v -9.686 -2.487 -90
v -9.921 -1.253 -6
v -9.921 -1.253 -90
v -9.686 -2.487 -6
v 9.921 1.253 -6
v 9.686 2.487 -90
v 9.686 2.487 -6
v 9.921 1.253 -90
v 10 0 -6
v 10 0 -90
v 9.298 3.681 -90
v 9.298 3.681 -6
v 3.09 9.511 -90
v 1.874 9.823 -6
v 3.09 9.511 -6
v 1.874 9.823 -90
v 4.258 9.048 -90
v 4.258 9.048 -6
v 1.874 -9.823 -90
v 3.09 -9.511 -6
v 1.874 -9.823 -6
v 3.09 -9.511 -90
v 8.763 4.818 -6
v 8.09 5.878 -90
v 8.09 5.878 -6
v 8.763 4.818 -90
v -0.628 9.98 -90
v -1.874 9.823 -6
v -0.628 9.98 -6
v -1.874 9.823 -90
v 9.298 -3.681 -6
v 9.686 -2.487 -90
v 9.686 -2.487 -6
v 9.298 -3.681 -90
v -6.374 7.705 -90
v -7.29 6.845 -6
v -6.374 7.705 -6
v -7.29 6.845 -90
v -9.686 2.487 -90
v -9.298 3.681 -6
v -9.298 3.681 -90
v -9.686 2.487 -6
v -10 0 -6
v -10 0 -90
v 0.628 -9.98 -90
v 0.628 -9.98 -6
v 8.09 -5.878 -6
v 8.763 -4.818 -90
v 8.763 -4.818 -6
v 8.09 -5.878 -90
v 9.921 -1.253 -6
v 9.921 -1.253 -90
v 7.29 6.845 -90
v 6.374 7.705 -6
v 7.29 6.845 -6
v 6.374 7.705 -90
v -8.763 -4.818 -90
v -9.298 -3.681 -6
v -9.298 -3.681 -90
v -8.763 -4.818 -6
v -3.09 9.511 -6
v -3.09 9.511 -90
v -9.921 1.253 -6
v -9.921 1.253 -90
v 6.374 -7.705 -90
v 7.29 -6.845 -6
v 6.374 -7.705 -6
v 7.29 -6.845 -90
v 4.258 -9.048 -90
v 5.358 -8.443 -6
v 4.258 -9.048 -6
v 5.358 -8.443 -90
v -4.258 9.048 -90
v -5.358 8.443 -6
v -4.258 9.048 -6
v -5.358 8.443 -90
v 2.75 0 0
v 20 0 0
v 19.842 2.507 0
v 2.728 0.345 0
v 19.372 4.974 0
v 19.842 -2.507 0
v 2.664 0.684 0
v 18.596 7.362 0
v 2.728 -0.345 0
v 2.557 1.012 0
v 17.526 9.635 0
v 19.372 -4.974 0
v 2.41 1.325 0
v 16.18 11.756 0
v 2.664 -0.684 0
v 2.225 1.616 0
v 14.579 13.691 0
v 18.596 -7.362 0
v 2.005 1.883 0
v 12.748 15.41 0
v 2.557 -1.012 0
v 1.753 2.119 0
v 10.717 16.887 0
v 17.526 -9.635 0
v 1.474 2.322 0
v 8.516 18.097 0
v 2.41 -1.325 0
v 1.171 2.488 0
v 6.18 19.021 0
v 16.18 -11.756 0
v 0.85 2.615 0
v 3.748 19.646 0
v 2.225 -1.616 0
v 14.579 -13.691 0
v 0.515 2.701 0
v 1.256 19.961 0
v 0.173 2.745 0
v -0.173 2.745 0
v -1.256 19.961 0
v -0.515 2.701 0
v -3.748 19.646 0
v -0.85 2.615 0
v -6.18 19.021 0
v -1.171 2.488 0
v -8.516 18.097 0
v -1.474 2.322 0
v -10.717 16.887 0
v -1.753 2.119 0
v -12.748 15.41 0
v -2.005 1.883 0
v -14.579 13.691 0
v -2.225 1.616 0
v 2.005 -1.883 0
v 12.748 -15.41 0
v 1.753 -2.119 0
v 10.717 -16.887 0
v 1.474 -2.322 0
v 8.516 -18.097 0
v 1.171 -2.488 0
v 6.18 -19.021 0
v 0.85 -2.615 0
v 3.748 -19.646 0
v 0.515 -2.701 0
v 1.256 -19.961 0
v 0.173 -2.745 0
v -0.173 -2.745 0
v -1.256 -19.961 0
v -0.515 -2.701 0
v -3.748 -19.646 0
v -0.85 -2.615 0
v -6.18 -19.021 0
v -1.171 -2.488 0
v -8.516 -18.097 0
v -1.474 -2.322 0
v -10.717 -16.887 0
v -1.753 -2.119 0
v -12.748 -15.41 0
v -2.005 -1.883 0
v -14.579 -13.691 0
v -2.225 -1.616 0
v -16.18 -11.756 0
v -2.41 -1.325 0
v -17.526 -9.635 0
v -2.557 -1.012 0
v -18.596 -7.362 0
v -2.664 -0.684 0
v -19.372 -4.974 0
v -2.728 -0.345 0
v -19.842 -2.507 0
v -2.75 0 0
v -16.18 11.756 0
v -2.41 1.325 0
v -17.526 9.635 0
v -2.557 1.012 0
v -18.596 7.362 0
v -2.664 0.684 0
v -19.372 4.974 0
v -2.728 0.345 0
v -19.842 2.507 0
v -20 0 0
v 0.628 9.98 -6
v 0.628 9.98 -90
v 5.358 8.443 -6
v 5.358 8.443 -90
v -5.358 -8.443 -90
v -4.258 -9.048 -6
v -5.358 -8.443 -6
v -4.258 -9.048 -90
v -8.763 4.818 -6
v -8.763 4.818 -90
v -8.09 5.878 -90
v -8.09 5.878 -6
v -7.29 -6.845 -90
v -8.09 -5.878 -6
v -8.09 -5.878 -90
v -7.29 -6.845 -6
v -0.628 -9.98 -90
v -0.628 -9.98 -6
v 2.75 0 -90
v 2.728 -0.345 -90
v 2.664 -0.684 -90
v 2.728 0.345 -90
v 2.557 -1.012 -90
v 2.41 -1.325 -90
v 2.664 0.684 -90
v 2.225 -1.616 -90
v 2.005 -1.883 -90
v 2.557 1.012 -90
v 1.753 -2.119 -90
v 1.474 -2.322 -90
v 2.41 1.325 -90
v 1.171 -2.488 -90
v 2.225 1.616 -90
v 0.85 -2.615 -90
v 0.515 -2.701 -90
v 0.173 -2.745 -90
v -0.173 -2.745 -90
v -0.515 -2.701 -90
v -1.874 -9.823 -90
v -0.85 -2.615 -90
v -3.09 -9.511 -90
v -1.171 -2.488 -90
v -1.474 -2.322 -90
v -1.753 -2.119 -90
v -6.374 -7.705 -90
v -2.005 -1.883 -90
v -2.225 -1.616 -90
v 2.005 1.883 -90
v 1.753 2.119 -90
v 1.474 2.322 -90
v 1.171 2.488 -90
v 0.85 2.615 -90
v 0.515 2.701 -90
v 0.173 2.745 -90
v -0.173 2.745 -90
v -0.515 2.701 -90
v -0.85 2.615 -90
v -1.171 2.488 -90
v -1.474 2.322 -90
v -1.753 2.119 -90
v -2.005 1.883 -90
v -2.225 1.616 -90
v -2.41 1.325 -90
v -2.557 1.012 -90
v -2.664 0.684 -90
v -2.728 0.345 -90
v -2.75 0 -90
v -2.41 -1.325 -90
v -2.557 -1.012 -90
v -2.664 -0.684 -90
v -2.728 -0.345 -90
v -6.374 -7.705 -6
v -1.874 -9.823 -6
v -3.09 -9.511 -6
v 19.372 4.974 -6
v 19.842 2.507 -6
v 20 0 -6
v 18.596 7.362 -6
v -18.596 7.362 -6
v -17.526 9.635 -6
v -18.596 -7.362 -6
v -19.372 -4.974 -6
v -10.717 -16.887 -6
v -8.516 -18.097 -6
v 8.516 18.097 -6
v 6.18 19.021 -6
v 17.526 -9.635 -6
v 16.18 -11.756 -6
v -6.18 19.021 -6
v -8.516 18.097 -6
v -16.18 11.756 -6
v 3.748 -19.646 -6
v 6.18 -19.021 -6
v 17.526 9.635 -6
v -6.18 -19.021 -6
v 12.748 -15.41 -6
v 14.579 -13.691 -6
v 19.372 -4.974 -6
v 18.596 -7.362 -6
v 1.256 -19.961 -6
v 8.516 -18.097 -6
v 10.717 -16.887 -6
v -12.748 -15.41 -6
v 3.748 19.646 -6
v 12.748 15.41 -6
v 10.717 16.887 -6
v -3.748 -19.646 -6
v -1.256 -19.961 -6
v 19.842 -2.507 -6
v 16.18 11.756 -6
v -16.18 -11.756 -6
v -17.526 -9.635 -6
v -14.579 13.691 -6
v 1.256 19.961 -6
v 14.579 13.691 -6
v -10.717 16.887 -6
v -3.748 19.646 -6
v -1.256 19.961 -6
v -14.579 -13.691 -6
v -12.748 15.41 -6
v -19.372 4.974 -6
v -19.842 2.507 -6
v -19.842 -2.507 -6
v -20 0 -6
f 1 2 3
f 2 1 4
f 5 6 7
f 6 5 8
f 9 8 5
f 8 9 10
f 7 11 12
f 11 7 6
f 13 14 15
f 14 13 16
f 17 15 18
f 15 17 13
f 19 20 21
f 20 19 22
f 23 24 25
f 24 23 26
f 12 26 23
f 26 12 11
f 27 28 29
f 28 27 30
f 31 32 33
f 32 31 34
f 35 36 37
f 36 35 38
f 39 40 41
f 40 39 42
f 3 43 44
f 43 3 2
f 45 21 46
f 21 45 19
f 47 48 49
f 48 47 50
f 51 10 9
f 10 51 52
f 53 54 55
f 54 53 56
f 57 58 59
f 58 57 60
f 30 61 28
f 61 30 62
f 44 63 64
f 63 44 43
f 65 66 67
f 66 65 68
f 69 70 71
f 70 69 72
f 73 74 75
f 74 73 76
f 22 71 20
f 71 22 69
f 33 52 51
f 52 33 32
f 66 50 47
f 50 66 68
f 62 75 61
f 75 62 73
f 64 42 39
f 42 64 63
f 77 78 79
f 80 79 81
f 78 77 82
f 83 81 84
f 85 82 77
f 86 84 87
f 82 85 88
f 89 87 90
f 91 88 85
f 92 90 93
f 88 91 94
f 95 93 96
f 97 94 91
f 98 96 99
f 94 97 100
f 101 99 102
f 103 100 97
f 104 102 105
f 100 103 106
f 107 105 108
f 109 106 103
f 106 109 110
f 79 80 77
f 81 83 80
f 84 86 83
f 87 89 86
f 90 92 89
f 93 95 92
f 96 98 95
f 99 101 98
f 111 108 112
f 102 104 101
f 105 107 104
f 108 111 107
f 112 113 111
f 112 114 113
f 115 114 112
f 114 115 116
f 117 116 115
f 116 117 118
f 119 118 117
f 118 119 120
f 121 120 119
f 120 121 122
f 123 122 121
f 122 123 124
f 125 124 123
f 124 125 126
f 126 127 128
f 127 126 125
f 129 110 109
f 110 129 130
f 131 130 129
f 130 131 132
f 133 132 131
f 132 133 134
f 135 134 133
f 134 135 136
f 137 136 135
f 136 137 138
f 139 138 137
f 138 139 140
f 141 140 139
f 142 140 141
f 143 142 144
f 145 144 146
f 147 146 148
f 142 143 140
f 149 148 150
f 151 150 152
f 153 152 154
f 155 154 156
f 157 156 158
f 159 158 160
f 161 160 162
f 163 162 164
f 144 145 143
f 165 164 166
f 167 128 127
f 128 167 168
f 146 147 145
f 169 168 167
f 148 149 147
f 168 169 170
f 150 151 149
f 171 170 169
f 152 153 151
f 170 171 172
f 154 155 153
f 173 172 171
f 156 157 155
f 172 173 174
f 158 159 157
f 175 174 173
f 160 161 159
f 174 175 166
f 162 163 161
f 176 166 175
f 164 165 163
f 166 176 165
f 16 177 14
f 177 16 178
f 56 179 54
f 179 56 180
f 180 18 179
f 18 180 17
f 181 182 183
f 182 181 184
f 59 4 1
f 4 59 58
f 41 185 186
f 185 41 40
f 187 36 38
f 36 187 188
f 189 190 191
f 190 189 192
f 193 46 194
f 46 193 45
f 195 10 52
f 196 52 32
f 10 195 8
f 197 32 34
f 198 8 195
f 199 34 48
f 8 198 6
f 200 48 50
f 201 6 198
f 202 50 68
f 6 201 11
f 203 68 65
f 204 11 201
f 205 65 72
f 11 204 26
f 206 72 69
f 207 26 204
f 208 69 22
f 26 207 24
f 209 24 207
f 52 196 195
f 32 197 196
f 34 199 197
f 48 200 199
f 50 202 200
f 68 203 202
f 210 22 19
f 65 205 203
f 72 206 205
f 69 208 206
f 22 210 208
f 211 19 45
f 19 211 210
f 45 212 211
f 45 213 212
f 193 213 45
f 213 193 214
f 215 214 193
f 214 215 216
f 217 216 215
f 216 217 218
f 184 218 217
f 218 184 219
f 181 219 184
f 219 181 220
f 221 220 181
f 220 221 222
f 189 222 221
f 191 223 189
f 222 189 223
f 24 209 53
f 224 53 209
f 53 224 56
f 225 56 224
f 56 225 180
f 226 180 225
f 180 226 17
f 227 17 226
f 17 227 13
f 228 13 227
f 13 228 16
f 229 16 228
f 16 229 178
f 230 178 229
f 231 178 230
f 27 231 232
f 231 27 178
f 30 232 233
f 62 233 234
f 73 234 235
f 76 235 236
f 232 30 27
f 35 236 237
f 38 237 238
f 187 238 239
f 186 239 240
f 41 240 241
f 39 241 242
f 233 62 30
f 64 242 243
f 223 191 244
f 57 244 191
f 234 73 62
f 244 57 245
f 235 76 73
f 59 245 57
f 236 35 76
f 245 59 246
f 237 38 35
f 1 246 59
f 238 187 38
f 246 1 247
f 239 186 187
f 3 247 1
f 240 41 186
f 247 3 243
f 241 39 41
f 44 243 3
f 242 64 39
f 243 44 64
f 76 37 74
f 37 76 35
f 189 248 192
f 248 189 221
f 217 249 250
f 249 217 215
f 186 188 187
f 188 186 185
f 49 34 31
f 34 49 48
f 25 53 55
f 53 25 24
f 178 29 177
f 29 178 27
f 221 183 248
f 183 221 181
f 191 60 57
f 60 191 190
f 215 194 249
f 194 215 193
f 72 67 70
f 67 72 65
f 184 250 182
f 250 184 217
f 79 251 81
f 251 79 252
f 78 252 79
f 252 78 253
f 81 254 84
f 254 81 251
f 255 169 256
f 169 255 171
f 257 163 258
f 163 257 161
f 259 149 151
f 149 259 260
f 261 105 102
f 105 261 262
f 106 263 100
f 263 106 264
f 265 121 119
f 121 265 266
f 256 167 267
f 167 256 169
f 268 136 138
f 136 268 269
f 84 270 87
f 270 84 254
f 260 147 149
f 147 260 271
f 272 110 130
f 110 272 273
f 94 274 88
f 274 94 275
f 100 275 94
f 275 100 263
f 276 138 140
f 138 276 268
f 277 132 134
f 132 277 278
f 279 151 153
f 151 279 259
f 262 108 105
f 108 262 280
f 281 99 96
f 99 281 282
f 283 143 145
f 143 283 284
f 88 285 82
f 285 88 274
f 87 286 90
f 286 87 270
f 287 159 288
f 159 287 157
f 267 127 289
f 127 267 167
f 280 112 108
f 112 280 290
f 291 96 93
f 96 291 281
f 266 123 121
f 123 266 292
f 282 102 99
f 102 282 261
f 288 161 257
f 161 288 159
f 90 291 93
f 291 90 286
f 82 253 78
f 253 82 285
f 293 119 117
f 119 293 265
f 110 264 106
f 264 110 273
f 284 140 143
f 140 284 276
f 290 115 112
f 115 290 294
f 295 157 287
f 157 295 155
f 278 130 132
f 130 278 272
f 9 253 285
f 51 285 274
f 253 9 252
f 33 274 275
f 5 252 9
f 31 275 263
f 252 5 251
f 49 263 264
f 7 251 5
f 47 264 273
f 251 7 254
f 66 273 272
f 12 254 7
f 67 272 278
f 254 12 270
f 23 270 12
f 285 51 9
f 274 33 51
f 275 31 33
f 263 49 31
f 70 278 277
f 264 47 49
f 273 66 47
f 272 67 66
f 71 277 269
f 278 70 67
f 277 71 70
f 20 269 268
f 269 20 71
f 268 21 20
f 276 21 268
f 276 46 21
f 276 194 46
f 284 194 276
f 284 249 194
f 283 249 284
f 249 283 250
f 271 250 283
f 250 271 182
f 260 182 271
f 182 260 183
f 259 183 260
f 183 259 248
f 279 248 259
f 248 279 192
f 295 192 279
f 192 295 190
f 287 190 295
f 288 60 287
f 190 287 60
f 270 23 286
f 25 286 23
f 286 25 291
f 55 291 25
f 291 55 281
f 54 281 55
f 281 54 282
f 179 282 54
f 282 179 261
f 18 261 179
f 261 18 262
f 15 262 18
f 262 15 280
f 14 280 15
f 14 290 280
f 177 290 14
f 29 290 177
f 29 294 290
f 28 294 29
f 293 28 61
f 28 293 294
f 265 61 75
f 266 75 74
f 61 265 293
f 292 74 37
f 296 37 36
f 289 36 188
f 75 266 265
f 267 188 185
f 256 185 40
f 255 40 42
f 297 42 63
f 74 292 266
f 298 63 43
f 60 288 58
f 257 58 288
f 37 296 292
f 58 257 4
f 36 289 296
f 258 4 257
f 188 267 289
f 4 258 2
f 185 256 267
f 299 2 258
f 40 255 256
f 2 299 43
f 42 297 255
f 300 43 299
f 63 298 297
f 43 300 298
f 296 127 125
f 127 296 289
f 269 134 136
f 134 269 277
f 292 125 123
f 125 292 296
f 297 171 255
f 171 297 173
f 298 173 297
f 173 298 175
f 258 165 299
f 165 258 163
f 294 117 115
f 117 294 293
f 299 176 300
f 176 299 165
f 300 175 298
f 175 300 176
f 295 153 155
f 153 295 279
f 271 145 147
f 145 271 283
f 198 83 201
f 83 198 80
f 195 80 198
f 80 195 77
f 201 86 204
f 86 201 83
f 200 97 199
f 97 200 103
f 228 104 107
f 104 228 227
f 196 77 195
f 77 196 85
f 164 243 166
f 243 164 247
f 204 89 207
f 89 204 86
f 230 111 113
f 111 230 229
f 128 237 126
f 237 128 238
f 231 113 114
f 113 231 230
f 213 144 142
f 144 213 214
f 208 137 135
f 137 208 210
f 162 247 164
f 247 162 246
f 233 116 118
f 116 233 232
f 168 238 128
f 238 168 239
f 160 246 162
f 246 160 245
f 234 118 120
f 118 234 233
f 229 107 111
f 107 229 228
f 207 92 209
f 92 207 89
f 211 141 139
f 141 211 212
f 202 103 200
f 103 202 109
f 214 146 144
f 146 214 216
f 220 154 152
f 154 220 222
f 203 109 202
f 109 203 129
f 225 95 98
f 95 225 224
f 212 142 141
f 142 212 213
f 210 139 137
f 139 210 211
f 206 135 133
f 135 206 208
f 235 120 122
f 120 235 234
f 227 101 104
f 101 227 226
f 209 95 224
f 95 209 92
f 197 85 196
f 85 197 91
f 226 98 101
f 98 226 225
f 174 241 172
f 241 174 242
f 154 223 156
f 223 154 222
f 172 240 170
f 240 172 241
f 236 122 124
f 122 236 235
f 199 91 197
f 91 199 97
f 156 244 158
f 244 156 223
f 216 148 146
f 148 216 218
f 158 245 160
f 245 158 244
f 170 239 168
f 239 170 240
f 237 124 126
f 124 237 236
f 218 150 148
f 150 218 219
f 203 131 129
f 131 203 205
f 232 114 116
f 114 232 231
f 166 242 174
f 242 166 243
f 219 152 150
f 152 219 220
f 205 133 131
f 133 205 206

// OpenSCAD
$fn = 50;


difference() {
	union() {
		translate(v = [0, 0, -90.0000000000]) {
			cylinder(h = 90, r = 10.0000000000);
		}
		translate(v = [0, 0, -6.0000000000]) {
			cylinder(h = 6, r = 20.0000000000);
		}
	}
	union() {
		#translate(v = [0, 0, -90]) {
			cylinder(h = 90, r = 2.7500000000);
		}
	}
}
